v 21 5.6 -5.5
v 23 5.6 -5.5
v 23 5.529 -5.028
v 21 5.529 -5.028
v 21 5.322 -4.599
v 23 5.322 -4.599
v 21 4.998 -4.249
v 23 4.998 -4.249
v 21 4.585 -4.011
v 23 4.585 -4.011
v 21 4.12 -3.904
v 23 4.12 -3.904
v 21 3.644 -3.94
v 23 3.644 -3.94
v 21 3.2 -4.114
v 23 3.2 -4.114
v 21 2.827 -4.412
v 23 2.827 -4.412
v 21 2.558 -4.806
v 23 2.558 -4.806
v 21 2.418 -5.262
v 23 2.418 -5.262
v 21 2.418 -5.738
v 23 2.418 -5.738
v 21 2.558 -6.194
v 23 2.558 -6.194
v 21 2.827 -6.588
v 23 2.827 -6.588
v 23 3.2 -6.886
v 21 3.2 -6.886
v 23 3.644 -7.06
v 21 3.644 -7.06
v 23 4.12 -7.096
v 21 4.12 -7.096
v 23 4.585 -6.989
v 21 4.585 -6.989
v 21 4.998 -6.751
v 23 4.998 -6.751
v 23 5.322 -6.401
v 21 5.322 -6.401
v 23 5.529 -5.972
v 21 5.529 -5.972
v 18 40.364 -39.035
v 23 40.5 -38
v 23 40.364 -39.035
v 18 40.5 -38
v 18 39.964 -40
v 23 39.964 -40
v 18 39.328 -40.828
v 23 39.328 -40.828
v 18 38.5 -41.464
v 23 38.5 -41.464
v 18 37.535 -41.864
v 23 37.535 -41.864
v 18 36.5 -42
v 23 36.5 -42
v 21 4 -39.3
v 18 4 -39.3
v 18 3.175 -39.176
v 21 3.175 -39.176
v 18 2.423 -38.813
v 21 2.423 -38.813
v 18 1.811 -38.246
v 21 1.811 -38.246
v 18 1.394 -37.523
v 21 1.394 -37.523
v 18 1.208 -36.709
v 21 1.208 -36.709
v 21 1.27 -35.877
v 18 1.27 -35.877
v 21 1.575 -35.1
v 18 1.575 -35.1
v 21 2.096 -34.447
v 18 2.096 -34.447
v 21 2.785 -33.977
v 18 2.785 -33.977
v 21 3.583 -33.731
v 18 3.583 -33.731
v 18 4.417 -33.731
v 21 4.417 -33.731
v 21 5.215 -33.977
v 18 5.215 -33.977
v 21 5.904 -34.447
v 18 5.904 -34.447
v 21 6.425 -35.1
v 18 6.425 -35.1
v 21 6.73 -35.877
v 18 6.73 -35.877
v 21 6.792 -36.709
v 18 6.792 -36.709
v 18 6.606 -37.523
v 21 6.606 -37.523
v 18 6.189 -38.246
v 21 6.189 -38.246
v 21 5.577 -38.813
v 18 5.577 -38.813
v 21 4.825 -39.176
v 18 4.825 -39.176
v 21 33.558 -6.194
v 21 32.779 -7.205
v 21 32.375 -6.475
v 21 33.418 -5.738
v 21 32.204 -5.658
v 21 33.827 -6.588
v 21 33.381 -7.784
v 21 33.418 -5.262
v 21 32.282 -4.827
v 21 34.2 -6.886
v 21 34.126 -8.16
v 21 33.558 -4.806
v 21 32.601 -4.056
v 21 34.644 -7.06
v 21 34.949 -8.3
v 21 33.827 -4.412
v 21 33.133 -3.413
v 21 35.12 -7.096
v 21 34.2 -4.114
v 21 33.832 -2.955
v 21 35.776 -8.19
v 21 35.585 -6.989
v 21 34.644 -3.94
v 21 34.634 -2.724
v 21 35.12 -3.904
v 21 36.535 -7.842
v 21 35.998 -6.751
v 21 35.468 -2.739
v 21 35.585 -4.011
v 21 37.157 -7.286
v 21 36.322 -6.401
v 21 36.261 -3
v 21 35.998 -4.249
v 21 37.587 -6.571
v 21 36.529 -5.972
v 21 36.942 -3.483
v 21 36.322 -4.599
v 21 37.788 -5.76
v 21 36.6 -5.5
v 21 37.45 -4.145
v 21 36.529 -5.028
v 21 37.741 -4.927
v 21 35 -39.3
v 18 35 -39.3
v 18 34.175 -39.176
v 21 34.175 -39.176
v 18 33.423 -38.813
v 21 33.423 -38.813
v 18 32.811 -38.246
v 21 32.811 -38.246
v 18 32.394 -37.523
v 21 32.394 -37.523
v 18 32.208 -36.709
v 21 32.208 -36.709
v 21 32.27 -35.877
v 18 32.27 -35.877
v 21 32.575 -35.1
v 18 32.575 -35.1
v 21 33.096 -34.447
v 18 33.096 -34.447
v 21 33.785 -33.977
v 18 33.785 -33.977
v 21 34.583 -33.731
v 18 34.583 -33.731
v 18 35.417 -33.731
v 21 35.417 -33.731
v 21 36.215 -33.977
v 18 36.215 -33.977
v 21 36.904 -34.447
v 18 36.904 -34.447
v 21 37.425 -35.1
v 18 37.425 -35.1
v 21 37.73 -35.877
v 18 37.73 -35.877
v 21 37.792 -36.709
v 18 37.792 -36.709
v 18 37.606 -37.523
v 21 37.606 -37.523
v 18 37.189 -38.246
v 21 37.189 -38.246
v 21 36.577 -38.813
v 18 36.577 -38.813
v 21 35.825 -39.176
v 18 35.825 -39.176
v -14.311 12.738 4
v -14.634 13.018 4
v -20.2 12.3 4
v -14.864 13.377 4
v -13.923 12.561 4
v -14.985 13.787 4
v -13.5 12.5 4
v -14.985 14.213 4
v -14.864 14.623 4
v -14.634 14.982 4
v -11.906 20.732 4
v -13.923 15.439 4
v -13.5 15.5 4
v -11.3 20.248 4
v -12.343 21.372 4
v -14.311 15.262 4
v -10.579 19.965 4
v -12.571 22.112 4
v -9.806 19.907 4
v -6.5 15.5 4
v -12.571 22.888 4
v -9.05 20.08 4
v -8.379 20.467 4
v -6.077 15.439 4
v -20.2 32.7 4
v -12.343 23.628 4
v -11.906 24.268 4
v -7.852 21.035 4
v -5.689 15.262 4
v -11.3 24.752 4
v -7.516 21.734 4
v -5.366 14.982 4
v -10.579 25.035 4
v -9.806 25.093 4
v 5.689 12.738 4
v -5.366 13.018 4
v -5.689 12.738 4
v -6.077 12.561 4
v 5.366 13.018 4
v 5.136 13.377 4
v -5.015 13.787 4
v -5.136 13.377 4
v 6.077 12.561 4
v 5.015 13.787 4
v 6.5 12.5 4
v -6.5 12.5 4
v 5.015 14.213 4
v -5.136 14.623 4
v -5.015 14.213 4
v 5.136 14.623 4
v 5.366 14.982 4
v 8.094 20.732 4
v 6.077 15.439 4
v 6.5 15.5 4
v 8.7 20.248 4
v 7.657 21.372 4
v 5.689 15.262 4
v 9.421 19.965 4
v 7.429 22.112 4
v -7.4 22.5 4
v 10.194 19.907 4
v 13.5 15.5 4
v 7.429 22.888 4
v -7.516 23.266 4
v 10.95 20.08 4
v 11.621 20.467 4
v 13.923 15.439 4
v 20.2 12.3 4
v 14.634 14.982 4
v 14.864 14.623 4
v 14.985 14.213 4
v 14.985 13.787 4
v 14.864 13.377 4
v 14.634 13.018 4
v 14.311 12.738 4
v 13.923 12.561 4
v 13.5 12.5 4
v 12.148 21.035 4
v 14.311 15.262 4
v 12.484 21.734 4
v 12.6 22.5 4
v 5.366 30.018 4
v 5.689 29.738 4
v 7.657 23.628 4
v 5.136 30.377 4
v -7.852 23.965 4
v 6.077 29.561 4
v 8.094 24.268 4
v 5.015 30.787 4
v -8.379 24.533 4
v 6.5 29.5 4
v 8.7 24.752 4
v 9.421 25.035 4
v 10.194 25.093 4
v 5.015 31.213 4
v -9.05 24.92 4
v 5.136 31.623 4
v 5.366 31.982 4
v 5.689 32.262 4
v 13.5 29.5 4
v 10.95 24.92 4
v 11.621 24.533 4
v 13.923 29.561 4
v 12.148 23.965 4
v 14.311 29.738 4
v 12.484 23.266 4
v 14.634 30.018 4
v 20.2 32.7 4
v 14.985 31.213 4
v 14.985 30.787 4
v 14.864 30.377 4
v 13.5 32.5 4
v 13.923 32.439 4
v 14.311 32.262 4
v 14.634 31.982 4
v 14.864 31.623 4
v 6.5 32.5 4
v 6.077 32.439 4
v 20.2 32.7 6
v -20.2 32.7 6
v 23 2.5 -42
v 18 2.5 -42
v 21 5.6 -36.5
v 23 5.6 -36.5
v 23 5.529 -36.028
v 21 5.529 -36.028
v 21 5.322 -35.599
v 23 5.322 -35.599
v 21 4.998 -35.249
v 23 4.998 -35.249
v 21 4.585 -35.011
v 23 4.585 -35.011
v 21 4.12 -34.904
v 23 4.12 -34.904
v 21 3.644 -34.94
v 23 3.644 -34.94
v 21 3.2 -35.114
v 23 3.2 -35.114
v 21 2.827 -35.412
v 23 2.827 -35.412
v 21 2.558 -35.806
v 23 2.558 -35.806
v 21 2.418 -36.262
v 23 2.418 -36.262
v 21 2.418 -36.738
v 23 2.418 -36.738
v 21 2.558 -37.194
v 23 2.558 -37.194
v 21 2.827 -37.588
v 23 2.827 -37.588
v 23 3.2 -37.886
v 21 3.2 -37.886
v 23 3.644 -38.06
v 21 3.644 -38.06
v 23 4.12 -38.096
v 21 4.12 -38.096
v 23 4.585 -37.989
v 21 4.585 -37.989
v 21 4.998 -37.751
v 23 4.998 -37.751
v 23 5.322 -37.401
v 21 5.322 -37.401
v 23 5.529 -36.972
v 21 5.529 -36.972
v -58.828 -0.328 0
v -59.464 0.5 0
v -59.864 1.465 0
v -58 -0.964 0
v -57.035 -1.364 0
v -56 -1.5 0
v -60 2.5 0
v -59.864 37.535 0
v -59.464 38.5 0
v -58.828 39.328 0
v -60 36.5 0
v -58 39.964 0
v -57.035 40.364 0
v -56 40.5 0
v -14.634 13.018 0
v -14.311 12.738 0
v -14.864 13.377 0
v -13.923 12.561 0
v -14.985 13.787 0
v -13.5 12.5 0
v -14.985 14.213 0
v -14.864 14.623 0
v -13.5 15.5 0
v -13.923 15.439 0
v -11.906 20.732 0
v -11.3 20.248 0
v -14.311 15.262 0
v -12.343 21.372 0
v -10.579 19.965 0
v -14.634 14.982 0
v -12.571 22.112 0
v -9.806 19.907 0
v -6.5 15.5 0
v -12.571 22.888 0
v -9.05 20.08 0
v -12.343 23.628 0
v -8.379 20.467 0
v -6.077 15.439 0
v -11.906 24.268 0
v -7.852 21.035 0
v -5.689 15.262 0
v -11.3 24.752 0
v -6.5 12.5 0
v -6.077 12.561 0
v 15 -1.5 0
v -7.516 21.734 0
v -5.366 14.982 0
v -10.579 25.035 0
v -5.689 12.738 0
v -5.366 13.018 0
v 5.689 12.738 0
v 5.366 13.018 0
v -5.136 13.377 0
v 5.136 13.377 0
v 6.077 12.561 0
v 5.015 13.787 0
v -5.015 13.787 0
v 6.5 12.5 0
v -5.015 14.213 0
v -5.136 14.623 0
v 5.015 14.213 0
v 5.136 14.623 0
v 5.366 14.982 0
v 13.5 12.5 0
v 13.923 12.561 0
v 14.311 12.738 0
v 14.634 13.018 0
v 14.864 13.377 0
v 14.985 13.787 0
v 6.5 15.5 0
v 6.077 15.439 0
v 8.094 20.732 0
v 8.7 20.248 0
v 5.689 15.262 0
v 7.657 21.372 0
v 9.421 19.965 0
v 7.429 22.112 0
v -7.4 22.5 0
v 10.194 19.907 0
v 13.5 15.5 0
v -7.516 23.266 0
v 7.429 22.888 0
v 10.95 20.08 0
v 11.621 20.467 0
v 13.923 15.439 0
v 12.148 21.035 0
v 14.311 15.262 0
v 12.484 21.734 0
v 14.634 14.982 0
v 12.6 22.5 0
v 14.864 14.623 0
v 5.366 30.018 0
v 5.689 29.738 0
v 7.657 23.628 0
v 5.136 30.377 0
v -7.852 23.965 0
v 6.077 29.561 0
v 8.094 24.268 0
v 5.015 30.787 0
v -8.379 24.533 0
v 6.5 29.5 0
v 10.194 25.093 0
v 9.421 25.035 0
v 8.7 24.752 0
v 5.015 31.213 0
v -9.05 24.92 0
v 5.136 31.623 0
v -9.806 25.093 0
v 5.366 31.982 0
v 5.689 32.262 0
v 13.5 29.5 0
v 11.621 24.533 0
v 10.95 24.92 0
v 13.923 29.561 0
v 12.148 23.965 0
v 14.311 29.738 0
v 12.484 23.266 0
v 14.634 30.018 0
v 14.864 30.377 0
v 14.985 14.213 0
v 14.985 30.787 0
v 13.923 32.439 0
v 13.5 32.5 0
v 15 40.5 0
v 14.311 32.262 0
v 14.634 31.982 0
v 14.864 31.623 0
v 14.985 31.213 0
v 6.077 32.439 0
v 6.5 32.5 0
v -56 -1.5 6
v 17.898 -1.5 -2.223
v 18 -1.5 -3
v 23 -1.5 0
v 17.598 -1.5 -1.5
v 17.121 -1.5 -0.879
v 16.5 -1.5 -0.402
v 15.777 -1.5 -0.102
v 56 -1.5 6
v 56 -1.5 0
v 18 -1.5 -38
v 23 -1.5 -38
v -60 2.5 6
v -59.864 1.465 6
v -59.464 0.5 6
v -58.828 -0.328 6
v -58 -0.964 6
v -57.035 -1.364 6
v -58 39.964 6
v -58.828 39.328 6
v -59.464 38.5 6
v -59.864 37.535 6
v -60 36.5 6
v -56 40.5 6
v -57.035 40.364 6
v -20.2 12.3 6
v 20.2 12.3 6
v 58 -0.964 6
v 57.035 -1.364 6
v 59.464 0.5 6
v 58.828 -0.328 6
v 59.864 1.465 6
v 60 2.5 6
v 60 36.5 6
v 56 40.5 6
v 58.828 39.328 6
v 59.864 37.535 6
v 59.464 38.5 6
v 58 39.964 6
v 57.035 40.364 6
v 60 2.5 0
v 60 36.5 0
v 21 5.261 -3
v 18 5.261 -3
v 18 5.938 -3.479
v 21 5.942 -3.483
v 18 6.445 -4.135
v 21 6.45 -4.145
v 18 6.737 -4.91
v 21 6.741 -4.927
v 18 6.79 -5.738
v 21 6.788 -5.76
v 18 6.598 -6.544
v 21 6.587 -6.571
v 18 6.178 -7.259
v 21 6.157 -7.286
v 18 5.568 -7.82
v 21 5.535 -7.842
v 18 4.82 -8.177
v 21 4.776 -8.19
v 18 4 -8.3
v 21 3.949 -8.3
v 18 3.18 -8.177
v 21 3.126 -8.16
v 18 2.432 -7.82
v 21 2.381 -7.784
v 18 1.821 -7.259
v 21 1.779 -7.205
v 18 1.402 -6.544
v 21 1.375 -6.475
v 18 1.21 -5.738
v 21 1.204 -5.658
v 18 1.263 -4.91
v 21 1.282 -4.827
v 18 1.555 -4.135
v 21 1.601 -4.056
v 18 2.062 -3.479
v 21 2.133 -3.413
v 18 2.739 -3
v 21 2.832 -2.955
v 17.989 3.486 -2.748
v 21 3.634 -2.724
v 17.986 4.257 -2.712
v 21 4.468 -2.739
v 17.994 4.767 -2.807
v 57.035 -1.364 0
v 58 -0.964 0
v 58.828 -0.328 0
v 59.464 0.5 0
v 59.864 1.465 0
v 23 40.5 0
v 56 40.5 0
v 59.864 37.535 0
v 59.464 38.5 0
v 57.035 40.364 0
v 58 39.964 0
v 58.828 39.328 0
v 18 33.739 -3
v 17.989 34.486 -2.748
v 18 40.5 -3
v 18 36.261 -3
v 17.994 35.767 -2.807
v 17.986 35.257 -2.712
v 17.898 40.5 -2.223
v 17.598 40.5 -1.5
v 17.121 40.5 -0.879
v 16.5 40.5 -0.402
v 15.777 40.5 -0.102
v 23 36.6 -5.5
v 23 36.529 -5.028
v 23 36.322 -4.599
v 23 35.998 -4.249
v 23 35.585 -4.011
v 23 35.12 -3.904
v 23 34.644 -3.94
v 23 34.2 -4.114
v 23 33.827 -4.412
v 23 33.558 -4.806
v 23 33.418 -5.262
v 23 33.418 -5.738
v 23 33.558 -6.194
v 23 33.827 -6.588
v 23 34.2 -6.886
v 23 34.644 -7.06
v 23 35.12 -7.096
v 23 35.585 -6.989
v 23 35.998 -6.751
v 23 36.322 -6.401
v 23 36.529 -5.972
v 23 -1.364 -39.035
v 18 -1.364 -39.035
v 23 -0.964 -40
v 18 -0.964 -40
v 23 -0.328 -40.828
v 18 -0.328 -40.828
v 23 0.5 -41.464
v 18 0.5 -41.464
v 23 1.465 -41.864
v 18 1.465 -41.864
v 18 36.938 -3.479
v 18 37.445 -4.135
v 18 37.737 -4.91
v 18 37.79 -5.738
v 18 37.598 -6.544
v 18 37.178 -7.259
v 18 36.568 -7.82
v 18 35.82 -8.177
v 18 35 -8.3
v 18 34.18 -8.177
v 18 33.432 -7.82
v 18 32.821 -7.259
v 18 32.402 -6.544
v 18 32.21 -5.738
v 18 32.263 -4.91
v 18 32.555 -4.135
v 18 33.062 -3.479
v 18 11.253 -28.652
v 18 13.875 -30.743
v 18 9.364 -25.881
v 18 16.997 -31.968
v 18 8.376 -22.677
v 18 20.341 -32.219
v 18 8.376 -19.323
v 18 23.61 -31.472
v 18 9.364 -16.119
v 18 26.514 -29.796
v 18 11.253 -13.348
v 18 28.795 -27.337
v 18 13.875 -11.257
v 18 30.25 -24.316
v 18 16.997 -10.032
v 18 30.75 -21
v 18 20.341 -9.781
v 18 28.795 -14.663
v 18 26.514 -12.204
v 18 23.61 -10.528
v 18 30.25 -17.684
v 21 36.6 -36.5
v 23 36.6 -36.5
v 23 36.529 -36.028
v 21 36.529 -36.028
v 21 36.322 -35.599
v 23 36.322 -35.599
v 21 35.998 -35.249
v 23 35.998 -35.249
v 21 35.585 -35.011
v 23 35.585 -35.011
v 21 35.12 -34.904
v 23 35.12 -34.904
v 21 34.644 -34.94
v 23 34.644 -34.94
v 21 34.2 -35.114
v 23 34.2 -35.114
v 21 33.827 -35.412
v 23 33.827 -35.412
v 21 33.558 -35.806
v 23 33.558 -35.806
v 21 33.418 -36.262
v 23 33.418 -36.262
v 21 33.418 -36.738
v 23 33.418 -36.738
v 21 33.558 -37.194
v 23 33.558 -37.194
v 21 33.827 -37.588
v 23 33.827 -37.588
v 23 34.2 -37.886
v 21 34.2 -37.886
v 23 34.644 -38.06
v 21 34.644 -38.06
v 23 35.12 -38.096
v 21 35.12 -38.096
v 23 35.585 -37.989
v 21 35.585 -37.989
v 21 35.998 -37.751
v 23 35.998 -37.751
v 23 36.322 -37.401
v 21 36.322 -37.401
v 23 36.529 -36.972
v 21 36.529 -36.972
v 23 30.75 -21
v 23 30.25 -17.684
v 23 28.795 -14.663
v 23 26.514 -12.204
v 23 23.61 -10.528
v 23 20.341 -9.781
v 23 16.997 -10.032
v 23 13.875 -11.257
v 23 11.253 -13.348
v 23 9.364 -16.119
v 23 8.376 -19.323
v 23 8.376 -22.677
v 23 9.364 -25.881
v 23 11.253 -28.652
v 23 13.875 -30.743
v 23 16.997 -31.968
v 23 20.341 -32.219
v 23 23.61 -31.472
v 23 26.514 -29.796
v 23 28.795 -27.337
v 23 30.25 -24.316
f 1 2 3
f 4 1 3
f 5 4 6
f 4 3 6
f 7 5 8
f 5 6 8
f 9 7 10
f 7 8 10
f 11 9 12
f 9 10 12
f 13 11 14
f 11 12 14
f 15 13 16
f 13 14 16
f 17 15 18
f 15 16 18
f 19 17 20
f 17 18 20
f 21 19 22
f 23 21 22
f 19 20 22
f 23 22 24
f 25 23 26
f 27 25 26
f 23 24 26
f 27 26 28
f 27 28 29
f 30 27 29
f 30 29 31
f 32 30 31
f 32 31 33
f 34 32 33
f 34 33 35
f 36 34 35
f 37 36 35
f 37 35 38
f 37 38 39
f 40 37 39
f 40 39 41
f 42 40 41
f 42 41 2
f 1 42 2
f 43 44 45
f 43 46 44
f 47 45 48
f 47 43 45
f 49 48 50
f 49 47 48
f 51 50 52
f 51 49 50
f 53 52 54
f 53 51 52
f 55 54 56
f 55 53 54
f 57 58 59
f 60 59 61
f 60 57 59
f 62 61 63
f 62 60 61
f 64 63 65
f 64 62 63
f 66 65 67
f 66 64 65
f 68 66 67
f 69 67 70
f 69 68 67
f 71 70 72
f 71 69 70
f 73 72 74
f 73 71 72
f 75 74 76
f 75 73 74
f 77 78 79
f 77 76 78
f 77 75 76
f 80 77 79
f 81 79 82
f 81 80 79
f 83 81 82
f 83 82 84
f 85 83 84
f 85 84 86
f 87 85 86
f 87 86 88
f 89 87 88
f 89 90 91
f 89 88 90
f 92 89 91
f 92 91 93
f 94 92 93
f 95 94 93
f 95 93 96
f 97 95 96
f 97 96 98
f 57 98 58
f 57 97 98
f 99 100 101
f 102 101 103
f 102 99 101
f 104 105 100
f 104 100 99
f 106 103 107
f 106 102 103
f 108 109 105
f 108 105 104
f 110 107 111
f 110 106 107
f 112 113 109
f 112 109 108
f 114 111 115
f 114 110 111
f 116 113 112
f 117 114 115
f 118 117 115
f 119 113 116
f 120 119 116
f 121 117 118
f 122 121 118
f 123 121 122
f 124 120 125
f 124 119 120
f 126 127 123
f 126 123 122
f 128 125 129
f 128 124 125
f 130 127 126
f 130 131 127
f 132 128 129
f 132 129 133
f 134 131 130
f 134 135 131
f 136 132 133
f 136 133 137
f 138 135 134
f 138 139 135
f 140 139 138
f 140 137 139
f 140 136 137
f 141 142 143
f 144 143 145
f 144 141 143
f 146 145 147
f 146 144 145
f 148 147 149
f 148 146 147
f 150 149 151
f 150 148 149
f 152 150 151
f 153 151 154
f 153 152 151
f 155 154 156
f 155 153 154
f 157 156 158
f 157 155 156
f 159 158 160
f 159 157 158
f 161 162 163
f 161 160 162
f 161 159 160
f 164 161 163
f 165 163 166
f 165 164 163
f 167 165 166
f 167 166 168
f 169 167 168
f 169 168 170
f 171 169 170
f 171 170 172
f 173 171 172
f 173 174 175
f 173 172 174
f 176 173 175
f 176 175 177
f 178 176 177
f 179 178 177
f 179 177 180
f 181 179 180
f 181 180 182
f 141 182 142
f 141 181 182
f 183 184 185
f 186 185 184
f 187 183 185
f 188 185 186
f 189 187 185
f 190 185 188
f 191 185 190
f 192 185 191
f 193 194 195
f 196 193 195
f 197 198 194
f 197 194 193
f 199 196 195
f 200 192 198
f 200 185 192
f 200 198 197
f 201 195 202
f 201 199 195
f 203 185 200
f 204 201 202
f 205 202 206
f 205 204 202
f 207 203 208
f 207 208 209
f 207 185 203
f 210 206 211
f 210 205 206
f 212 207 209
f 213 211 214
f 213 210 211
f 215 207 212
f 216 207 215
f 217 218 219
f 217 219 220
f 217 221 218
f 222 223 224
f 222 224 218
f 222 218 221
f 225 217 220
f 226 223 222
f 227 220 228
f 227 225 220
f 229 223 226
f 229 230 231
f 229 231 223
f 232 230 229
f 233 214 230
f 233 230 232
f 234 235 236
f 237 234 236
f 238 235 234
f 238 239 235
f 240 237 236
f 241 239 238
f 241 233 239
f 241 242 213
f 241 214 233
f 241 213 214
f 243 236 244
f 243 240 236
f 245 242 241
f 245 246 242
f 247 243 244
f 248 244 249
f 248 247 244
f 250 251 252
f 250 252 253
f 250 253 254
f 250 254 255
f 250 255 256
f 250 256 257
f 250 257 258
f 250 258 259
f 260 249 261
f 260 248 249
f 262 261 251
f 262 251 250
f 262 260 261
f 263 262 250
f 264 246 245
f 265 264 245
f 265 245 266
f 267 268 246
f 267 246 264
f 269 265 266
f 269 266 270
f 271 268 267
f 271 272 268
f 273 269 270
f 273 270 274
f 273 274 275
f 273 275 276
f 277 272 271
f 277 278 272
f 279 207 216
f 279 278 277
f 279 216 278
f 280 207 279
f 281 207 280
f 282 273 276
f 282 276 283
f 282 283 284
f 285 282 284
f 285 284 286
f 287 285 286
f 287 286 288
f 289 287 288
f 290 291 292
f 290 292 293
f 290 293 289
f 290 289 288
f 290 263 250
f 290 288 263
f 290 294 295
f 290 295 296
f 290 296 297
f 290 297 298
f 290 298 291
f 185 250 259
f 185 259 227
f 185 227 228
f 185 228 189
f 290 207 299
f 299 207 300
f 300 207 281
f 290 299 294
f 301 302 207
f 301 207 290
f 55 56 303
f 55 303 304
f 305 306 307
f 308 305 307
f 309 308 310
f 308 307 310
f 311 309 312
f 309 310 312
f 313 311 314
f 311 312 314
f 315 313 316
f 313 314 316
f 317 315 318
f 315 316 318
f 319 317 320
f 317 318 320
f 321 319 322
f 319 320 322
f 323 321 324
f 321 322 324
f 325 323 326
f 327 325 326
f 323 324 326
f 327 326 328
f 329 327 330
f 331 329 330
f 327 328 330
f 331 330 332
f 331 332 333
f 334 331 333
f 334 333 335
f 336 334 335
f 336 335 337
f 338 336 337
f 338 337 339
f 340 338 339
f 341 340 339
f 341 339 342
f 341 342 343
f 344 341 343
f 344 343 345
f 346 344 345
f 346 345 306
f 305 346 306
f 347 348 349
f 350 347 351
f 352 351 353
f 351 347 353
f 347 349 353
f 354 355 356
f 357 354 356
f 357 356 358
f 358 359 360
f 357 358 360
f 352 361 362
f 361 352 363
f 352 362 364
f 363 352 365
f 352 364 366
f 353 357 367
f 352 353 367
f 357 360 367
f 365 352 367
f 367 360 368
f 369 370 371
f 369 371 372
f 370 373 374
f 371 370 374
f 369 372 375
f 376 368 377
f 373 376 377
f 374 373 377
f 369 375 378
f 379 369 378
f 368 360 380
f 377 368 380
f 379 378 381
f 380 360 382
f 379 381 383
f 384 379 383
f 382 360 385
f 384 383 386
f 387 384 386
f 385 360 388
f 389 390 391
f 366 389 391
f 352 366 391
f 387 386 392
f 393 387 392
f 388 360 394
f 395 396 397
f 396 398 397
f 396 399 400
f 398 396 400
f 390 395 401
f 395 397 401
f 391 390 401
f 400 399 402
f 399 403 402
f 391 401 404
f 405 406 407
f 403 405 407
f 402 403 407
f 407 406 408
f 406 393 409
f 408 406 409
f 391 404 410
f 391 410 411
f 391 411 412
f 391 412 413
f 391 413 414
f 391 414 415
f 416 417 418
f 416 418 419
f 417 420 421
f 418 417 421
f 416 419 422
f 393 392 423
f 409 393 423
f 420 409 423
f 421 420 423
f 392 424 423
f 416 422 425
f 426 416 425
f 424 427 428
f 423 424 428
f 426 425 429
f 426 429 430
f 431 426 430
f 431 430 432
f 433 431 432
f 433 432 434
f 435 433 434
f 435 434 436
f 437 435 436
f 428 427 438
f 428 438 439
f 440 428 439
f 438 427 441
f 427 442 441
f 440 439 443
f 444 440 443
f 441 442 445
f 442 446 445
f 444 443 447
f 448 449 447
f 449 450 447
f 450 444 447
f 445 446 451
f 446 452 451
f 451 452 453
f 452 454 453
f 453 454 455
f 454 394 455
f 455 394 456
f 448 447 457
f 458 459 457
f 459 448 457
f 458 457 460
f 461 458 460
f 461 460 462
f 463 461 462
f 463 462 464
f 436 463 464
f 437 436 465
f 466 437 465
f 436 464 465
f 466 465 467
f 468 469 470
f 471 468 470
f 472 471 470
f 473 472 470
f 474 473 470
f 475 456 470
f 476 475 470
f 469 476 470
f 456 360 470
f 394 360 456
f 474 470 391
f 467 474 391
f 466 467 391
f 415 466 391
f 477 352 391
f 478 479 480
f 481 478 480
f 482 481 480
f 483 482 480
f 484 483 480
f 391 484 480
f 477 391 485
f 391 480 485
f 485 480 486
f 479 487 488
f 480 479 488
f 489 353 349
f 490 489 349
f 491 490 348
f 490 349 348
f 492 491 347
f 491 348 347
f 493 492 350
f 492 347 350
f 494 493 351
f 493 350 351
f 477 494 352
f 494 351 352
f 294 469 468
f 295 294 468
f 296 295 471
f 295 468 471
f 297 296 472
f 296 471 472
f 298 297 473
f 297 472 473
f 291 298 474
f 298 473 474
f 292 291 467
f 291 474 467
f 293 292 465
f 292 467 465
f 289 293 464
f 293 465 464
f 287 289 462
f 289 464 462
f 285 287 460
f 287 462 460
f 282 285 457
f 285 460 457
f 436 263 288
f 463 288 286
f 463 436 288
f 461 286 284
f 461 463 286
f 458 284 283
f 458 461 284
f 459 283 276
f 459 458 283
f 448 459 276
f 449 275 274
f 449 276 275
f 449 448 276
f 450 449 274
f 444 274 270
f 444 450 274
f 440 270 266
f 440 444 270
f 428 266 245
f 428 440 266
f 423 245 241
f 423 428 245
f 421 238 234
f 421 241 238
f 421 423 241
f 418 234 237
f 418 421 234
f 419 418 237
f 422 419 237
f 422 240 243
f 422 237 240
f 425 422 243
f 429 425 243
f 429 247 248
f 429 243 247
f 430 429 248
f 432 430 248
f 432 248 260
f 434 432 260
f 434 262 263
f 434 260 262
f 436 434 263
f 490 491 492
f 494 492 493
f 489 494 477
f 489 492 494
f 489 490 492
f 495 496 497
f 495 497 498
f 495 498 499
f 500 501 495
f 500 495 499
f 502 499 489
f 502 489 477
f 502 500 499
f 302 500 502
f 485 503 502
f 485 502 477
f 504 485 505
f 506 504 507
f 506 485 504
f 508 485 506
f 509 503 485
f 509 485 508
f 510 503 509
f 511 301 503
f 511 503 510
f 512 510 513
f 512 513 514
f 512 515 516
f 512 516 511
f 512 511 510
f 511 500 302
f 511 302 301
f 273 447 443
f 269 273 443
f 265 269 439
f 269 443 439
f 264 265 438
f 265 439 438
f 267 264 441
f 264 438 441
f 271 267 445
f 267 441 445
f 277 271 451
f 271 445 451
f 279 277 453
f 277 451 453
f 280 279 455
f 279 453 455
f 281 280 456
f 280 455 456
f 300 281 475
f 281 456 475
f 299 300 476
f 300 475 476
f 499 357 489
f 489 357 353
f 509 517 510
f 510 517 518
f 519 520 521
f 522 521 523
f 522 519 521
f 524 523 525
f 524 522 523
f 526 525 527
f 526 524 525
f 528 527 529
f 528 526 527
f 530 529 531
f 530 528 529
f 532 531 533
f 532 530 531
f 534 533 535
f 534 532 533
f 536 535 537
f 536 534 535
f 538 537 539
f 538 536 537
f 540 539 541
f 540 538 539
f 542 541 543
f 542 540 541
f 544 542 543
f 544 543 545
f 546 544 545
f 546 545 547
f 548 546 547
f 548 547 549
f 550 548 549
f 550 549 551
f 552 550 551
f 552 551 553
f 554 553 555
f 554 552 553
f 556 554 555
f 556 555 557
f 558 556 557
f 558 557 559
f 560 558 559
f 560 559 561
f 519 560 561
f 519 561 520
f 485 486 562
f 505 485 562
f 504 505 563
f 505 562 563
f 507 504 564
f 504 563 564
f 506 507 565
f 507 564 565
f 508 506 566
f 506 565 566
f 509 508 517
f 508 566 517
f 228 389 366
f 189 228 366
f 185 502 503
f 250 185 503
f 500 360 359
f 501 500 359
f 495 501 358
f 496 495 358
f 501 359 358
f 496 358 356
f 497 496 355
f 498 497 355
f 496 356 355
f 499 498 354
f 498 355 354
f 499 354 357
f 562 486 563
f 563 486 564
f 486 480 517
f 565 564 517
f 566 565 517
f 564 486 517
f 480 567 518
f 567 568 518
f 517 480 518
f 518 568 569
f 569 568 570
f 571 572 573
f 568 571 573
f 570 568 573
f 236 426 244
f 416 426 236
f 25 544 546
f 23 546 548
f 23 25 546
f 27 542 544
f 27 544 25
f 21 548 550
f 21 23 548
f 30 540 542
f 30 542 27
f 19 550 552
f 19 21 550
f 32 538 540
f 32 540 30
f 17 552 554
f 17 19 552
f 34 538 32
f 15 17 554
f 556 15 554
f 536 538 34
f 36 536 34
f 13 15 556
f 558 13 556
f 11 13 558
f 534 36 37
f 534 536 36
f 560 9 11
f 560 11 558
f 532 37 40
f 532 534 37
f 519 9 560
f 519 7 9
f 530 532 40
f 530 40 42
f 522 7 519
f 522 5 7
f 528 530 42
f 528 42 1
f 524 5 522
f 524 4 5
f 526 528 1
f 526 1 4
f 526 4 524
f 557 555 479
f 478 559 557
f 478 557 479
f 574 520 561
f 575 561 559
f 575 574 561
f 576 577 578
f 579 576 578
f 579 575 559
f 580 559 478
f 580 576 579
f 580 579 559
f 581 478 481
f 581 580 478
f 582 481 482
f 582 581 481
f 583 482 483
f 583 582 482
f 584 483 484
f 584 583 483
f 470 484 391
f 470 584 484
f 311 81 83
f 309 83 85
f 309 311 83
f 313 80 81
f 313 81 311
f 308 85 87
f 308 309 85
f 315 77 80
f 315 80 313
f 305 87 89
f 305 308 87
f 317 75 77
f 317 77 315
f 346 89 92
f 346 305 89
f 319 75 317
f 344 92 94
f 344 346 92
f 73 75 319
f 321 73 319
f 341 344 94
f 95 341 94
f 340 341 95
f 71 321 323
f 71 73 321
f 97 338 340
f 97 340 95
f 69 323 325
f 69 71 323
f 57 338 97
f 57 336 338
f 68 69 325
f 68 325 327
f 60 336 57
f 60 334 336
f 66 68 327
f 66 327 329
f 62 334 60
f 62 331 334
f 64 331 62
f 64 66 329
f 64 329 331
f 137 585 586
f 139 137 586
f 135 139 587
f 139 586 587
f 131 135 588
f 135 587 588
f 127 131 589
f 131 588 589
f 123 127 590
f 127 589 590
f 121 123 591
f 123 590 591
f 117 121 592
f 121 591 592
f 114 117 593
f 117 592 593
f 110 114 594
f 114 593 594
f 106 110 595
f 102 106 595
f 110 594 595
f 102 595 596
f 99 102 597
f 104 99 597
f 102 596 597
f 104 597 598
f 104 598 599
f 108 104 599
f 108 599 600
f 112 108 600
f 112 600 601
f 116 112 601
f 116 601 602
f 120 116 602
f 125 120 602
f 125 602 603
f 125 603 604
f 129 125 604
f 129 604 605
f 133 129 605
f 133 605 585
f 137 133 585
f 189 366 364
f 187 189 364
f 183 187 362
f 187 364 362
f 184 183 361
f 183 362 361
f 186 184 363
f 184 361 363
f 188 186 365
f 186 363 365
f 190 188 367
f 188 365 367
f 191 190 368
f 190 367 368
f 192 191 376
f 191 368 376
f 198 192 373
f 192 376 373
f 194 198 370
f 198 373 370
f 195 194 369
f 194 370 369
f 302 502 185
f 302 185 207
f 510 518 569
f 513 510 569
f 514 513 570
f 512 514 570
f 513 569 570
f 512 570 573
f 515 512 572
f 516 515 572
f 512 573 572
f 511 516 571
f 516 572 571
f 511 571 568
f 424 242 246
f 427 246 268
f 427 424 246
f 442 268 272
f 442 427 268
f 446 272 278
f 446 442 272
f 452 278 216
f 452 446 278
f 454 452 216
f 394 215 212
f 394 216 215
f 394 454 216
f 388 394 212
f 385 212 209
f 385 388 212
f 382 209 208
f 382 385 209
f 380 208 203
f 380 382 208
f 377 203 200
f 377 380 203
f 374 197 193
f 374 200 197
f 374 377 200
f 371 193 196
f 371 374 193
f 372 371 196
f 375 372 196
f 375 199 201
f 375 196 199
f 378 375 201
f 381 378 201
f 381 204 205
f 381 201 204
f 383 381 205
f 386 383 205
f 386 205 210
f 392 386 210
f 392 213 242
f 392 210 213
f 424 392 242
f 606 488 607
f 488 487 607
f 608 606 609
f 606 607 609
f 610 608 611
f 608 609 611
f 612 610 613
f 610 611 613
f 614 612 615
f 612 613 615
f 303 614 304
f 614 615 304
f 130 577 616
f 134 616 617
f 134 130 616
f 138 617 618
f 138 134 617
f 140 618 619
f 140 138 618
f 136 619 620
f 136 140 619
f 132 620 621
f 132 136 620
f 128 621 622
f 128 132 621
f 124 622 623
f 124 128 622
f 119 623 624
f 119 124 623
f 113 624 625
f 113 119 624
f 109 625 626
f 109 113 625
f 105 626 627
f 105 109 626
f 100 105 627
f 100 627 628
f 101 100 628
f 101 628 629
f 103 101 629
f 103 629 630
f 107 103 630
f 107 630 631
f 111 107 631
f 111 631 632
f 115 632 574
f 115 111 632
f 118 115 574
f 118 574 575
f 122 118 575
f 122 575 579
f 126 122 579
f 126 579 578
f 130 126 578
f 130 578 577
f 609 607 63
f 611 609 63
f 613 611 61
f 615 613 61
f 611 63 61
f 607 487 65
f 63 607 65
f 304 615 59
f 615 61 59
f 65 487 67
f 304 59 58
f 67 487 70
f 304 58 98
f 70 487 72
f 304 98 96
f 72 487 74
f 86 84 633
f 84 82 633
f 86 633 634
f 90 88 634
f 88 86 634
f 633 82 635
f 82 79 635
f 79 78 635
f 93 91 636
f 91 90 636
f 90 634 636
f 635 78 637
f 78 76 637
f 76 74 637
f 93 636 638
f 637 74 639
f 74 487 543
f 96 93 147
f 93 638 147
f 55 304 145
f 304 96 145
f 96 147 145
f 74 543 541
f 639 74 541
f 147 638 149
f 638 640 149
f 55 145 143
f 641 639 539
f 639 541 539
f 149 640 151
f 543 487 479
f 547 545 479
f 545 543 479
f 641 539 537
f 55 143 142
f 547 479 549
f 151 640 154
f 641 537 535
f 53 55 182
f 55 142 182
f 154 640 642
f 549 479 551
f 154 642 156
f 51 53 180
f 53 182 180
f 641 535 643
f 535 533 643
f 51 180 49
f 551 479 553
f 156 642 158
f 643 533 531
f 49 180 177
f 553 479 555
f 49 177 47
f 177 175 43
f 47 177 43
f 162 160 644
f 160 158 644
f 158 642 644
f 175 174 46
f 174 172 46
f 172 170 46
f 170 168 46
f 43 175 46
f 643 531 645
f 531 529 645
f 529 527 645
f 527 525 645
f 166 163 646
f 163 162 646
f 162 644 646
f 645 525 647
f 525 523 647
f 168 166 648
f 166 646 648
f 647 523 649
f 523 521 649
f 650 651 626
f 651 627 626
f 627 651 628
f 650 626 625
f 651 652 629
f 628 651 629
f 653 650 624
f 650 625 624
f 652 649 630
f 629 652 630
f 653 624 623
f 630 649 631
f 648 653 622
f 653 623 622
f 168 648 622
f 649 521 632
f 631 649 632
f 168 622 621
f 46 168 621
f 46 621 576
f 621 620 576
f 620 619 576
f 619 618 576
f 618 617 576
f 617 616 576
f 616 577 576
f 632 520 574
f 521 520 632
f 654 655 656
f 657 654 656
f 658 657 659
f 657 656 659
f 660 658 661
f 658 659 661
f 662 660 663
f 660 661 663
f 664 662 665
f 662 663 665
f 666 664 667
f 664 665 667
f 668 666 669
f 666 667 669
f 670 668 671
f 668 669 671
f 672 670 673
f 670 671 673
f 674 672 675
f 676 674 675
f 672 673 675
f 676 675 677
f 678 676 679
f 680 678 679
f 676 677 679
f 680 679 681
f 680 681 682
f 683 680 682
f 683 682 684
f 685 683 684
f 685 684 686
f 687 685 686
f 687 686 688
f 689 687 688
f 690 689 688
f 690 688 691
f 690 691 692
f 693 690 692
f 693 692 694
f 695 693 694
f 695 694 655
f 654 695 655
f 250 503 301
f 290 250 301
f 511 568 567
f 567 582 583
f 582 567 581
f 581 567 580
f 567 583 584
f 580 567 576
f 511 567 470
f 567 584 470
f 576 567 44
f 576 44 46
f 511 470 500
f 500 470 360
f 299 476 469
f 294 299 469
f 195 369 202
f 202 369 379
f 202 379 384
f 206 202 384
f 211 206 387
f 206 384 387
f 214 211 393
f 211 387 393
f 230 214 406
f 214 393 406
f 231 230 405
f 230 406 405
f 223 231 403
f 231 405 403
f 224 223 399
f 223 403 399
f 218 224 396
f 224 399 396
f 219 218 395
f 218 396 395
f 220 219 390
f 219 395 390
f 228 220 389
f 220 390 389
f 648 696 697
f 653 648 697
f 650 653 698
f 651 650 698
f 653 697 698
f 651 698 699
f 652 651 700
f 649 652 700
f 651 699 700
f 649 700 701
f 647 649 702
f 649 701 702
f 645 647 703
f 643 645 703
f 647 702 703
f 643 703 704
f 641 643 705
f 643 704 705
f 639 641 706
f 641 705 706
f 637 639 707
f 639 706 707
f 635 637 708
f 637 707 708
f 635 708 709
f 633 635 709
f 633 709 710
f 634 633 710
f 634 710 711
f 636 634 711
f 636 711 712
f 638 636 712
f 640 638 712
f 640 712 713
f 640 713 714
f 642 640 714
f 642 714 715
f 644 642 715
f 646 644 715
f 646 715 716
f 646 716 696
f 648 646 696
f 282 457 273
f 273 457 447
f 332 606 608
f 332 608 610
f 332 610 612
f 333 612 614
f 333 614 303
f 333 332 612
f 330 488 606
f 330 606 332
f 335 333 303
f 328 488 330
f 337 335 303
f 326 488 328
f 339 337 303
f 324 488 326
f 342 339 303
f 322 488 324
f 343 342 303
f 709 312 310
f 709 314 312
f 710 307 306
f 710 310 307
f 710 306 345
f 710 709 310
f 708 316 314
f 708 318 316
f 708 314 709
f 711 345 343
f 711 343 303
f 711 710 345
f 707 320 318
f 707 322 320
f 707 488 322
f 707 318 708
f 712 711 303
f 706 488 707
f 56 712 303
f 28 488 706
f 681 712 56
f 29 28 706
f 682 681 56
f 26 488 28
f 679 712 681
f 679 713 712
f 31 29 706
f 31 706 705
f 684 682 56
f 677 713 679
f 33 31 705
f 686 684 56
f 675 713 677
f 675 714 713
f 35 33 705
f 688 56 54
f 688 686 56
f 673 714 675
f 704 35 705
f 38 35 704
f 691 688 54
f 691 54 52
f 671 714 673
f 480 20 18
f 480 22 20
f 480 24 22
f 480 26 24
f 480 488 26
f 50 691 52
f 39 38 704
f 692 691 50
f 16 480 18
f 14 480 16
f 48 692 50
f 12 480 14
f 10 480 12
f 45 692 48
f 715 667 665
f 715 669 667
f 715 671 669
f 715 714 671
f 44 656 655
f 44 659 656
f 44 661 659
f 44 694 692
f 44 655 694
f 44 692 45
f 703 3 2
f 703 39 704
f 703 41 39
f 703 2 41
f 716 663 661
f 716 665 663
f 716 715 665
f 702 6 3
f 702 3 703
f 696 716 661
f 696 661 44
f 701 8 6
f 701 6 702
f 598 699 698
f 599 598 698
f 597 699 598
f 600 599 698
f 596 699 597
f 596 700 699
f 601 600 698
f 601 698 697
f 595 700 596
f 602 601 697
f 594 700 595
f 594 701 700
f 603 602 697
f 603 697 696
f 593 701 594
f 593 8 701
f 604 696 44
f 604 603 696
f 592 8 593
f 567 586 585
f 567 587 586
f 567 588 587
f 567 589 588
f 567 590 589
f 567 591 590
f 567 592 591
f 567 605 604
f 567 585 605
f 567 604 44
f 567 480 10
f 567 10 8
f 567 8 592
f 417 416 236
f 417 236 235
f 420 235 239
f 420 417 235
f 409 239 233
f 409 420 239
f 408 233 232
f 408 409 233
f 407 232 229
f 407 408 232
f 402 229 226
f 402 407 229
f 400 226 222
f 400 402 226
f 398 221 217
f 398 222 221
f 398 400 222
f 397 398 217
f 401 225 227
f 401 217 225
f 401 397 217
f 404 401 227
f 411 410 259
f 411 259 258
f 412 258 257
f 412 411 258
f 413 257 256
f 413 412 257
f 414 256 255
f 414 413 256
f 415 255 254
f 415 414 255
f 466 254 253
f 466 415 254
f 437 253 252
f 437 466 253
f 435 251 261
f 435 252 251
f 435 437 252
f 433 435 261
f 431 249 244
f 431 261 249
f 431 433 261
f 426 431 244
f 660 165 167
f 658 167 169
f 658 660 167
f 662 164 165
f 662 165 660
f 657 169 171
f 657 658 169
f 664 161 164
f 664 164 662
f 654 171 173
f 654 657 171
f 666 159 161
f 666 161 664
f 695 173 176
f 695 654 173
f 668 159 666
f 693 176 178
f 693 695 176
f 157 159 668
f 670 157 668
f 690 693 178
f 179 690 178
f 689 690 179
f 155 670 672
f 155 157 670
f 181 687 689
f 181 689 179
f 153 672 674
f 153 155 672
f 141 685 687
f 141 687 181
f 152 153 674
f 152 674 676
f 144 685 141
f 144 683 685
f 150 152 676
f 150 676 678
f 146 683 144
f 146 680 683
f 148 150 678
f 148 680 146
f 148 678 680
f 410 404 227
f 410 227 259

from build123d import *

# Parameters (mm, degrees)
SKETCH1_R               = 2.6
BOSS_EXTRUDE1_DEPTH     = 6
SKETCH8_W               = 40.4
SKETCH8_H               = 20.4
CUT_EXTRUDE4_DEPTH      = 2
SKETCH9_W               = 5
SKETCH9_H               = 42
BOSS_EXTRUDE2_DEPTH     = 42
FILLET1_R               = 4
FILLET2_R               = 3
SKETCH10_R              = 11.25
SKETCH10_R_2            = 1.6
CUT_EXTRUDE5_DEPTH      = 42
CUT_EXTRUDE6_DEPTH      = 3
CUT_EXTRUDE6_DEPTH_BACK = 3
SKETCH11_R              = 2.8


with BuildPart() as part:
    # Sketch1 → Boss-Extrude1 (new body)
    with BuildSketch(Plane.XY):
        with BuildLine():
            Line((-56, -1.5), (20, -1.5))
            Line((20, -1.5), (56, -1.5))
            ThreePointArc((56, -1.5), (58.828427125, -0.328427125), (60, 2.5))
            Line((60, 2.5), (60, 36.5))
            ThreePointArc((60, 36.5), (58.828427125, 39.328427125), (56, 40.5))
            Line((56, 40.5), (-56, 40.5))
            ThreePointArc((-56, 40.5), (-58.828427125, 39.328427125), (-60, 36.5))
            Line((-60, 36.5), (-60, 2.5))
            ThreePointArc((-60, 2.5), (-58.828427125, -0.328427125), (-56, -1.5))
        make_face()
        with Locations((10, 22.5)):
            Circle(SKETCH1_R, mode=Mode.SUBTRACT)
        with Locations((-10, 22.5)):
            Circle(SKETCH1_R, mode=Mode.SUBTRACT)
        with BuildLine():
            Line((-13.5, 15.5), (-6.5, 15.5))
            ThreePointArc((-6.5, 15.5), (-5, 14), (-6.5, 12.5))
            Line((-6.5, 12.5), (-13.5, 12.5))
            ThreePointArc((-13.5, 12.5), (-15, 14), (-13.5, 15.5))
        make_face(mode=Mode.SUBTRACT)
        with BuildLine():
            Line((13.5, 15.5), (6.5, 15.5))
            ThreePointArc((6.5, 15.5), (5, 14), (6.5, 12.5))
            Line((6.5, 12.5), (13.5, 12.5))
            ThreePointArc((13.5, 12.5), (15, 14), (13.5, 15.5))
        make_face(mode=Mode.SUBTRACT)
        with BuildLine():
            Line((13.5, 29.5), (6.5, 29.5))
            ThreePointArc((6.5, 29.5), (5, 31), (6.5, 32.5))
            Line((6.5, 32.5), (13.5, 32.5))
            ThreePointArc((13.5, 32.5), (15, 31), (13.5, 29.5))
        make_face(mode=Mode.SUBTRACT)
    extrude(amount=BOSS_EXTRUDE1_DEPTH)

    # Sketch8 → Cut-Extrude4 (cut)
    with BuildSketch(Plane.XY.offset(6)):
        with Locations((0, 22.5)):
            Rectangle(SKETCH8_W, SKETCH8_H)
    extrude(amount=-CUT_EXTRUDE4_DEPTH, mode=Mode.SUBTRACT)

    # Sketch9 → Boss-Extrude2 (add)
    with BuildSketch(Plane(origin=(0, 0, 0), x_dir=(-1, 0, 0), z_dir=(0, 0, -1))):
        with Locations((-20.5, 19.5)):
            Rectangle(SKETCH9_W, SKETCH9_H)
    extrude(amount=BOSS_EXTRUDE2_DEPTH)

    # Fillet1
    fillet1_edges = [part.edges().sort_by_distance(p)[0] for p in [
        (20.5, 40.5, -42),
        (20.5, -1.5, -42),
    ]]
    fillet(fillet1_edges, radius=FILLET1_R)

    # Fillet2
    fillet2_edges = [part.edges().sort_by_distance(p)[0] for p in [
        (18, 19.5, 0),
    ]]
    fillet(fillet2_edges, radius=FILLET2_R - 0.0001)  # a hair under: the kernel refuses the full size

    # Sketch10 → Cut-Extrude5 (cut)
    with BuildSketch(Plane(origin=(23, 0, 0), x_dir=(0, 0, -1), z_dir=(1, 0, 0))):
        with Locations(Location((21, 19.5, 0), (0, 0, 90))):
            Circle(SKETCH10_R)
        with Locations(Location((5.5, 35, 0), (0, 0, 90))):
            Circle(SKETCH10_R_2)
        with Locations(Location((36.5, 35, 0), (0, 0, 90))):
            Circle(SKETCH10_R_2)
        with Locations(Location((36.5, 4, 0), (0, 0, 90))):
            Circle(SKETCH10_R_2)
        with Locations(Location((5.5, 4, 0), (0, 0, 90))):
            Circle(SKETCH10_R_2)
    extrude(amount=-CUT_EXTRUDE5_DEPTH, mode=Mode.SUBTRACT)

    # Sketch11 → Cut-Extrude6 (cut, two sides: drawn at the far end of the back side and taken through both)
    with BuildSketch(Plane.ZY.offset(-18).offset(-CUT_EXTRUDE6_DEPTH_BACK)):
        with Locations(Location((-36.5, 35, 0), (0, 0, 180))):
            Circle(SKETCH11_R)
        with Locations(Location((-5.5, 35, 0), (0, 0, 26.765500577))):
            Circle(SKETCH11_R)
        with Locations(Location((-5.5, 4, 0), (0, 0, 26.765500577))):
            Circle(SKETCH11_R)
        with Locations(Location((-36.5, 4, 0), (0, 0, 180))):
            Circle(SKETCH11_R)
    extrude(amount=CUT_EXTRUDE6_DEPTH + CUT_EXTRUDE6_DEPTH_BACK, mode=Mode.SUBTRACT)


solid = part.part
